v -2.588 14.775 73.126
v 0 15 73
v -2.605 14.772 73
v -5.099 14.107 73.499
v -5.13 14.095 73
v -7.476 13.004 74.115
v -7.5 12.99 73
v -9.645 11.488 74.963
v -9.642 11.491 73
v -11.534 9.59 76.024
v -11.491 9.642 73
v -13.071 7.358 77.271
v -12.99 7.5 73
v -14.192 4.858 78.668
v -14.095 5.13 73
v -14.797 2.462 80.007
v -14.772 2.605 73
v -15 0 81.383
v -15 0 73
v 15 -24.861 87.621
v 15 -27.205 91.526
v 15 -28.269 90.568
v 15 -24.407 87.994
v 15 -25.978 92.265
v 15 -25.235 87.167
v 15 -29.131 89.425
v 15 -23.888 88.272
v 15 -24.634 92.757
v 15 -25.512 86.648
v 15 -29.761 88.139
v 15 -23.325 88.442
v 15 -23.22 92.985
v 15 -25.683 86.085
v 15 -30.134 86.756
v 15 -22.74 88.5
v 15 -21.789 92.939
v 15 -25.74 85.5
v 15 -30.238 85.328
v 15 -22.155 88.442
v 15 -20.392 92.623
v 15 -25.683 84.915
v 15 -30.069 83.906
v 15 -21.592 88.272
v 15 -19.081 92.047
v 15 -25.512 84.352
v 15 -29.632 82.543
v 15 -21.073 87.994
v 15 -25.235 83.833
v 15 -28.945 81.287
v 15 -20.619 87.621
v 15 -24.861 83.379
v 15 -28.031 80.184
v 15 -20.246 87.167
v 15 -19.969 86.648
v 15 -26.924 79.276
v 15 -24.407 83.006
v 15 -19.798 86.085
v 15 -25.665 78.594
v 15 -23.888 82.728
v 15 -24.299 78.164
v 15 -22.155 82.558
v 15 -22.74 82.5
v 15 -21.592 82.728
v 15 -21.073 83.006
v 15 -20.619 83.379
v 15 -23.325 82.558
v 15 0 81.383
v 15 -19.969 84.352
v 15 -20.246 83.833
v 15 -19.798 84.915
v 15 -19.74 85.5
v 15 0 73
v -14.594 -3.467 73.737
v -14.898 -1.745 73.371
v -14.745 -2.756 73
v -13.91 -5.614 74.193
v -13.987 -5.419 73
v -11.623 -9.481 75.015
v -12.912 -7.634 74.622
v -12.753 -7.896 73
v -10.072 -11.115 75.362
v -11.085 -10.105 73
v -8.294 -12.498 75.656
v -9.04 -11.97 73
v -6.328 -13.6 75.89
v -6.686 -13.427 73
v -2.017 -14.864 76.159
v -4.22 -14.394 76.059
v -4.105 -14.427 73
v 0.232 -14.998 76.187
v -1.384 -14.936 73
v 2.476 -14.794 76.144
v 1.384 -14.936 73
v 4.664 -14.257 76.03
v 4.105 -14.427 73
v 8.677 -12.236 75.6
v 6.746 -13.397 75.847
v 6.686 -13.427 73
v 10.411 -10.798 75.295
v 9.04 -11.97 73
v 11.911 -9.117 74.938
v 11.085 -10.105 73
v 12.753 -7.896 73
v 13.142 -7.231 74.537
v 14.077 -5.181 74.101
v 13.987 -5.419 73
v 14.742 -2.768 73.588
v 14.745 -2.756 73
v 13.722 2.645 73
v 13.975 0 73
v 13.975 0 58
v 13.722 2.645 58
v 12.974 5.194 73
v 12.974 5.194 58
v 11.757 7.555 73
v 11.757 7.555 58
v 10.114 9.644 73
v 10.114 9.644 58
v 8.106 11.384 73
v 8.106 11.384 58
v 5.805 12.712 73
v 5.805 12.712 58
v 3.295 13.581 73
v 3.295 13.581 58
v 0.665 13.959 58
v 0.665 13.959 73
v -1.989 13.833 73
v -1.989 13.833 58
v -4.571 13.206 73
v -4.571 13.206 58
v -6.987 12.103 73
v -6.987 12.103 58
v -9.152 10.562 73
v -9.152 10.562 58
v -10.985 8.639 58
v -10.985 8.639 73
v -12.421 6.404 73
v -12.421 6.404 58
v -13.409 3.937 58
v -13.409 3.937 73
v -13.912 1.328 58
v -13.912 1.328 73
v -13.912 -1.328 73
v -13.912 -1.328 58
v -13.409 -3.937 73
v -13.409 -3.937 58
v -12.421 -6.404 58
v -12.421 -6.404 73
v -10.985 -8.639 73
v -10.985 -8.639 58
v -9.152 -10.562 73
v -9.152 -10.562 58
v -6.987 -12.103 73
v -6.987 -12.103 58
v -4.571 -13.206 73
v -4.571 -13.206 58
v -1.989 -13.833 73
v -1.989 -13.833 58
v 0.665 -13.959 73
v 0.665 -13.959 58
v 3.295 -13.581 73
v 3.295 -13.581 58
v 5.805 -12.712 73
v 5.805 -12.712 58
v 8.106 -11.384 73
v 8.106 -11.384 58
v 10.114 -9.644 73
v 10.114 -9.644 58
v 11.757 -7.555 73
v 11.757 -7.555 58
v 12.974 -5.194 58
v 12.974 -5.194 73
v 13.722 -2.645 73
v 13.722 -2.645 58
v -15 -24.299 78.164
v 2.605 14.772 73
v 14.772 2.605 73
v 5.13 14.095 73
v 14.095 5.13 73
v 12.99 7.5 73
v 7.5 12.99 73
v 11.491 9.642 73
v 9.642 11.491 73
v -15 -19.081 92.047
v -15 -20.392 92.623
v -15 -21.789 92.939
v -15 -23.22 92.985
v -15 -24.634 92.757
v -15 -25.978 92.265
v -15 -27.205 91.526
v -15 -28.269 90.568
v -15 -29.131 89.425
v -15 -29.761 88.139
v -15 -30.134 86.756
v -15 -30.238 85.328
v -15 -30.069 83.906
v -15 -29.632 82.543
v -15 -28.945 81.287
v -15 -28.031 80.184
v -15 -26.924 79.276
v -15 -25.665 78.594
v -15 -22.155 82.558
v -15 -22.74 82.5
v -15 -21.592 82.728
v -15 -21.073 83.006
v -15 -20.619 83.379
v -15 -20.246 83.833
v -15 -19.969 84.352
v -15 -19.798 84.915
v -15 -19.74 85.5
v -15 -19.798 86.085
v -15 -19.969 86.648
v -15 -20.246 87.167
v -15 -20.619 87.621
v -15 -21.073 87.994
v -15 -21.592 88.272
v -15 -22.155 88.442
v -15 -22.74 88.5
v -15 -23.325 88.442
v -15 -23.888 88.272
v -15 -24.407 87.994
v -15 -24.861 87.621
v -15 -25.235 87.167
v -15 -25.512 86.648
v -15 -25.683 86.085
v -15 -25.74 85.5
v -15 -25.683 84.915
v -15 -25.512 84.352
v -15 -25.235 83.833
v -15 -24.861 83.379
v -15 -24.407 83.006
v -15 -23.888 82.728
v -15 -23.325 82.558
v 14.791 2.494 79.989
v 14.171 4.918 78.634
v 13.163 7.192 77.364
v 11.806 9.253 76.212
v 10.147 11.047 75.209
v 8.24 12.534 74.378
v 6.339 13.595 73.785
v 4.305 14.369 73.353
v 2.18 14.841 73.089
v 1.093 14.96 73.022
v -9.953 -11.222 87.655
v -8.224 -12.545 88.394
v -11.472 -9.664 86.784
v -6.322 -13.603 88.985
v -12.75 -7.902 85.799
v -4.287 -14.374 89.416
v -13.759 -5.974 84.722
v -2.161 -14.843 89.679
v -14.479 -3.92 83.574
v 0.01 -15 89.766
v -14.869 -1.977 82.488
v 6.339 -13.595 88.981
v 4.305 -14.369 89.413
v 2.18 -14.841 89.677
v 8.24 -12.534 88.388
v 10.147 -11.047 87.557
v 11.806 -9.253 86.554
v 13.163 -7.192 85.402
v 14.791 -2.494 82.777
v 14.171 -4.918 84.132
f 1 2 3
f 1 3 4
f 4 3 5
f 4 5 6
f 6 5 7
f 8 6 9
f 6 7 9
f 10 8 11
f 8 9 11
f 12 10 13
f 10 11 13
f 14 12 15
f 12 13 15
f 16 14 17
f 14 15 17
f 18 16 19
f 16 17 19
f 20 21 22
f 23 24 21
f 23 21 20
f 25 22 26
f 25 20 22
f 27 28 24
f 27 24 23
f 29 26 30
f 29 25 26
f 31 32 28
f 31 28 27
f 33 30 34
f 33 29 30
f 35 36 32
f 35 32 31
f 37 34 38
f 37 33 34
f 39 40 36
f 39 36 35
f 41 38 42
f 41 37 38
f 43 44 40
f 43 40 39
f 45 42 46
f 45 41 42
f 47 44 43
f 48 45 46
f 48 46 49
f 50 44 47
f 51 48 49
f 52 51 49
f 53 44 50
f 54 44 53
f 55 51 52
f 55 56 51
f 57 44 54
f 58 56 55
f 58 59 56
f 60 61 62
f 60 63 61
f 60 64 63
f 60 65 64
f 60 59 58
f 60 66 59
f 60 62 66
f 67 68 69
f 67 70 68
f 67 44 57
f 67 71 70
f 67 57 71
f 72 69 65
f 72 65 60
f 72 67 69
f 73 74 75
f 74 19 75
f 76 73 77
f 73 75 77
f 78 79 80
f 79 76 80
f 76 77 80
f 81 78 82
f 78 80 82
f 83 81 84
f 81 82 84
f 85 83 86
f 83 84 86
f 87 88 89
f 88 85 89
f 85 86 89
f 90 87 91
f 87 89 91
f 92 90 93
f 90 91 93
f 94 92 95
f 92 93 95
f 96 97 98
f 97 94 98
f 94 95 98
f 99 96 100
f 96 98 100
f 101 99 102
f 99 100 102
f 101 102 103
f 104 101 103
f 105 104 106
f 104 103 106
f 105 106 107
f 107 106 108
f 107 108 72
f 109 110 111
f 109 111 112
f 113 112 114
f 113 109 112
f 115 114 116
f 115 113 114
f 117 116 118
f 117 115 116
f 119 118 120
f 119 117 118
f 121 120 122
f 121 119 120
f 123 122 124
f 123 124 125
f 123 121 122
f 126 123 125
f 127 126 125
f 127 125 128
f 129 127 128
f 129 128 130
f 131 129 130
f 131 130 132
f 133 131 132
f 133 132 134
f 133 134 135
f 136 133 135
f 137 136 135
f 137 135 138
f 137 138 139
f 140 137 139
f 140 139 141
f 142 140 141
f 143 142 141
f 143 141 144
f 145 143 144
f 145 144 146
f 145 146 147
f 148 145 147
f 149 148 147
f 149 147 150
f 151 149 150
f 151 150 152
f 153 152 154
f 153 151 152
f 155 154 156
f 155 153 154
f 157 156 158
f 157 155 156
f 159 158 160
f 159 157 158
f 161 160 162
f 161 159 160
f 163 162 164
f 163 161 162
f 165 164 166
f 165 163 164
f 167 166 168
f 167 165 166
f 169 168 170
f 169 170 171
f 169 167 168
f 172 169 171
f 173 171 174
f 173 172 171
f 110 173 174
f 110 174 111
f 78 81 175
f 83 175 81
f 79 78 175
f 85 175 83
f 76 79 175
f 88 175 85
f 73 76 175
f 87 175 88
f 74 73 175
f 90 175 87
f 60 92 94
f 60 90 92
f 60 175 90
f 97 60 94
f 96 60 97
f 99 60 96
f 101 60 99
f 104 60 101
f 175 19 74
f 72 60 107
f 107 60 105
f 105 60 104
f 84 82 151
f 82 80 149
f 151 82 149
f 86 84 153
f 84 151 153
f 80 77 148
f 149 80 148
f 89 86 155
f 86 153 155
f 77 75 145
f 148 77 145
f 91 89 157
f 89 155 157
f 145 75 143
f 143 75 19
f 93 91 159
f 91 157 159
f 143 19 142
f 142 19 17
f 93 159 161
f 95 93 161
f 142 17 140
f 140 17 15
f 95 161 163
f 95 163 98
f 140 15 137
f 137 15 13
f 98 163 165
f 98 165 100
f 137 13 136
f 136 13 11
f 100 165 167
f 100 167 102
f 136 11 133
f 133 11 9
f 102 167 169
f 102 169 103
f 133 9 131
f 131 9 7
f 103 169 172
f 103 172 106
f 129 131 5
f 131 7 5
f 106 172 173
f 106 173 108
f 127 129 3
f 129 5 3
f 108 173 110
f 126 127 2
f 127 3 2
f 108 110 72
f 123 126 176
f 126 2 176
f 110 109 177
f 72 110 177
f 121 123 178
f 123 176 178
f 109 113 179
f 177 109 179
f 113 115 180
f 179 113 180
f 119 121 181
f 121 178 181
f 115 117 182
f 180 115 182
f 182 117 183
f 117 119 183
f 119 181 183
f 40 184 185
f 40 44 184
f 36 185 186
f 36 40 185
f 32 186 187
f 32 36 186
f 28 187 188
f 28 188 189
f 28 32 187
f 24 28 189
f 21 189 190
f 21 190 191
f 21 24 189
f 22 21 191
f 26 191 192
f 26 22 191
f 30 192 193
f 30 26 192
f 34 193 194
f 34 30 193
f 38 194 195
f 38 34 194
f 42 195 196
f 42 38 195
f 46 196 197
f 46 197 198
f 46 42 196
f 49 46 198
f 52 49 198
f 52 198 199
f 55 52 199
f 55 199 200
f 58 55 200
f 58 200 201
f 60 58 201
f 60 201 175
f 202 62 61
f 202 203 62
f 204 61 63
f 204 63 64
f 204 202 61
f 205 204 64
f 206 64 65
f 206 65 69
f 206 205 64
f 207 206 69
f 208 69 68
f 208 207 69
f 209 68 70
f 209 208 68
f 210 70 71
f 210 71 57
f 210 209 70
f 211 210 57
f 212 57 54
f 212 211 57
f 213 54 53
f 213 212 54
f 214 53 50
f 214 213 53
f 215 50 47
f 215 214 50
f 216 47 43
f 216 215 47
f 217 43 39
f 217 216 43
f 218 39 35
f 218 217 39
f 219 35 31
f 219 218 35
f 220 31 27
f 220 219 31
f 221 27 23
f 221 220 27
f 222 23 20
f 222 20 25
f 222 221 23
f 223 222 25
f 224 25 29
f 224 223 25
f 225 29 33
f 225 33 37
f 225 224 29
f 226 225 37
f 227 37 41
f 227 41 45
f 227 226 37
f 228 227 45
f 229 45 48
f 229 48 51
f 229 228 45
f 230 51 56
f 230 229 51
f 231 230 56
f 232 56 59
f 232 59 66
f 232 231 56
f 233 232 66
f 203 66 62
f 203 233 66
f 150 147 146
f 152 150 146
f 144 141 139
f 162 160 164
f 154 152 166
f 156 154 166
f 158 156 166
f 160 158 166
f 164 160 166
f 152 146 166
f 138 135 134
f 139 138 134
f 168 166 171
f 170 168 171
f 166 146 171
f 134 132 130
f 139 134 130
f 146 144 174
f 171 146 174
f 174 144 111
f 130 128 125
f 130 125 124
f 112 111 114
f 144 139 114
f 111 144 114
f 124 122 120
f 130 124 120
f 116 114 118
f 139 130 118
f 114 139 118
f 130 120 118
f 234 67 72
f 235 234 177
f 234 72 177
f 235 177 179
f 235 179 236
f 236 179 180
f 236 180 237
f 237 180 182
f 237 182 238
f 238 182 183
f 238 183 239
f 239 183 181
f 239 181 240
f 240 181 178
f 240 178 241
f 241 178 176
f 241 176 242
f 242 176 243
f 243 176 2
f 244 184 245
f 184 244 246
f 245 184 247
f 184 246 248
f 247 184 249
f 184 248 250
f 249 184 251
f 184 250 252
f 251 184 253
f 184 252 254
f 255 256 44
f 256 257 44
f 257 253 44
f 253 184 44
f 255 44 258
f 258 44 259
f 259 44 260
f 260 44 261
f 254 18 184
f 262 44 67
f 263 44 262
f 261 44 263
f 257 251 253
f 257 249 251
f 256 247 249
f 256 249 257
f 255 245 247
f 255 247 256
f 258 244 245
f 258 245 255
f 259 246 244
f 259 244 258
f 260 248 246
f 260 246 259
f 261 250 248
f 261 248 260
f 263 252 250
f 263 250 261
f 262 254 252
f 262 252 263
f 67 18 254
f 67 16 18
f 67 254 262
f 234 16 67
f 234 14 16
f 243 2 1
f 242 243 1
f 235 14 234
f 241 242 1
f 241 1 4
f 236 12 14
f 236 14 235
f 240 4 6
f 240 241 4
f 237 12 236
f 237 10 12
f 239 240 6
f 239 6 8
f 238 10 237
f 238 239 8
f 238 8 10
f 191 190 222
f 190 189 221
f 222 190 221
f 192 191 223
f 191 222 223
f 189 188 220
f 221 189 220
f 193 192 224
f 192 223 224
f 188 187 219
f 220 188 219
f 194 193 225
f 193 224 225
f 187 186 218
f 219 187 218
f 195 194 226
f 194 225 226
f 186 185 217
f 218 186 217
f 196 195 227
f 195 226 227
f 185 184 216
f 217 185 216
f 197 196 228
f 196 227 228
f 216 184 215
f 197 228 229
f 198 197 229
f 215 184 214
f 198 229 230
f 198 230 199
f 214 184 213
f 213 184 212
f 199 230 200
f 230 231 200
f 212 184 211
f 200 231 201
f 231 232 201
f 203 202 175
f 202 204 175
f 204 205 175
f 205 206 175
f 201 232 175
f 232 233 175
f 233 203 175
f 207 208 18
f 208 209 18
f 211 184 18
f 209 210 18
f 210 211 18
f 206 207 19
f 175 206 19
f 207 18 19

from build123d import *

# Parameters (mm, degrees)
SKETCH002_R  = 13.975
PAD002_DEPTH = 15
SKETCH003_R  = 15
PAD003_DEPTH = 25
SKETCH004_R  = 3
PAD004_DEPTH = 15
BOX_W        = 44
BOX_H        = 61
BOX_DEPTH    = 44


with BuildPart() as part:
    # Sketch002 (on DatumPlane) → Pad002 (new body)
    with BuildSketch(Plane.XY.offset(73)):
        Circle(SKETCH002_R)
    extrude(amount=-PAD002_DEPTH)

    # Sketch003 (on DatumPlane) → Pad003 (join)
    with BuildSketch(Plane.XY.offset(73)):
        Circle(SKETCH003_R)
    extrude(amount=PAD003_DEPTH)

    # Sketch004 (on DatumPlane) → Pad004 (join, symmetric)
    with BuildSketch(Plane(origin=(0, 0, 85.5), x_dir=(0, 0, -1), z_dir=(1, 0, 0))):
        with BuildLine():
            ThreePointArc((-6.5469509024, -19.0812783951), (-2.6386229499, -29.760680346), (7.3361760867, -24.2991752795))
            Line((7.3361760867, -24.2991752795), (12.5, 0))
            Line((4.1169733945, 0), (12.5, 0))
            Line((-6.5469509024, -19.0812783951), (4.1169733945, 0))
        make_face()
        with Locations((0, -22.7401626351)):
            Circle(SKETCH004_R, mode=Mode.SUBTRACT)
    extrude(amount=PAD004_DEPTH, both=True)

    # Box → Box (cut)
    with BuildSketch(Plane(origin=(-23, -30.474162324, 98.414074175), x_dir=(1, 0, 0), z_dir=(0, 0.487851232, 0.872926787))):
        with Locations((22, 30.5)):
            Rectangle(BOX_W, BOX_H)
    extrude(amount=BOX_DEPTH, mode=Mode.SUBTRACT)


solid = part.part
